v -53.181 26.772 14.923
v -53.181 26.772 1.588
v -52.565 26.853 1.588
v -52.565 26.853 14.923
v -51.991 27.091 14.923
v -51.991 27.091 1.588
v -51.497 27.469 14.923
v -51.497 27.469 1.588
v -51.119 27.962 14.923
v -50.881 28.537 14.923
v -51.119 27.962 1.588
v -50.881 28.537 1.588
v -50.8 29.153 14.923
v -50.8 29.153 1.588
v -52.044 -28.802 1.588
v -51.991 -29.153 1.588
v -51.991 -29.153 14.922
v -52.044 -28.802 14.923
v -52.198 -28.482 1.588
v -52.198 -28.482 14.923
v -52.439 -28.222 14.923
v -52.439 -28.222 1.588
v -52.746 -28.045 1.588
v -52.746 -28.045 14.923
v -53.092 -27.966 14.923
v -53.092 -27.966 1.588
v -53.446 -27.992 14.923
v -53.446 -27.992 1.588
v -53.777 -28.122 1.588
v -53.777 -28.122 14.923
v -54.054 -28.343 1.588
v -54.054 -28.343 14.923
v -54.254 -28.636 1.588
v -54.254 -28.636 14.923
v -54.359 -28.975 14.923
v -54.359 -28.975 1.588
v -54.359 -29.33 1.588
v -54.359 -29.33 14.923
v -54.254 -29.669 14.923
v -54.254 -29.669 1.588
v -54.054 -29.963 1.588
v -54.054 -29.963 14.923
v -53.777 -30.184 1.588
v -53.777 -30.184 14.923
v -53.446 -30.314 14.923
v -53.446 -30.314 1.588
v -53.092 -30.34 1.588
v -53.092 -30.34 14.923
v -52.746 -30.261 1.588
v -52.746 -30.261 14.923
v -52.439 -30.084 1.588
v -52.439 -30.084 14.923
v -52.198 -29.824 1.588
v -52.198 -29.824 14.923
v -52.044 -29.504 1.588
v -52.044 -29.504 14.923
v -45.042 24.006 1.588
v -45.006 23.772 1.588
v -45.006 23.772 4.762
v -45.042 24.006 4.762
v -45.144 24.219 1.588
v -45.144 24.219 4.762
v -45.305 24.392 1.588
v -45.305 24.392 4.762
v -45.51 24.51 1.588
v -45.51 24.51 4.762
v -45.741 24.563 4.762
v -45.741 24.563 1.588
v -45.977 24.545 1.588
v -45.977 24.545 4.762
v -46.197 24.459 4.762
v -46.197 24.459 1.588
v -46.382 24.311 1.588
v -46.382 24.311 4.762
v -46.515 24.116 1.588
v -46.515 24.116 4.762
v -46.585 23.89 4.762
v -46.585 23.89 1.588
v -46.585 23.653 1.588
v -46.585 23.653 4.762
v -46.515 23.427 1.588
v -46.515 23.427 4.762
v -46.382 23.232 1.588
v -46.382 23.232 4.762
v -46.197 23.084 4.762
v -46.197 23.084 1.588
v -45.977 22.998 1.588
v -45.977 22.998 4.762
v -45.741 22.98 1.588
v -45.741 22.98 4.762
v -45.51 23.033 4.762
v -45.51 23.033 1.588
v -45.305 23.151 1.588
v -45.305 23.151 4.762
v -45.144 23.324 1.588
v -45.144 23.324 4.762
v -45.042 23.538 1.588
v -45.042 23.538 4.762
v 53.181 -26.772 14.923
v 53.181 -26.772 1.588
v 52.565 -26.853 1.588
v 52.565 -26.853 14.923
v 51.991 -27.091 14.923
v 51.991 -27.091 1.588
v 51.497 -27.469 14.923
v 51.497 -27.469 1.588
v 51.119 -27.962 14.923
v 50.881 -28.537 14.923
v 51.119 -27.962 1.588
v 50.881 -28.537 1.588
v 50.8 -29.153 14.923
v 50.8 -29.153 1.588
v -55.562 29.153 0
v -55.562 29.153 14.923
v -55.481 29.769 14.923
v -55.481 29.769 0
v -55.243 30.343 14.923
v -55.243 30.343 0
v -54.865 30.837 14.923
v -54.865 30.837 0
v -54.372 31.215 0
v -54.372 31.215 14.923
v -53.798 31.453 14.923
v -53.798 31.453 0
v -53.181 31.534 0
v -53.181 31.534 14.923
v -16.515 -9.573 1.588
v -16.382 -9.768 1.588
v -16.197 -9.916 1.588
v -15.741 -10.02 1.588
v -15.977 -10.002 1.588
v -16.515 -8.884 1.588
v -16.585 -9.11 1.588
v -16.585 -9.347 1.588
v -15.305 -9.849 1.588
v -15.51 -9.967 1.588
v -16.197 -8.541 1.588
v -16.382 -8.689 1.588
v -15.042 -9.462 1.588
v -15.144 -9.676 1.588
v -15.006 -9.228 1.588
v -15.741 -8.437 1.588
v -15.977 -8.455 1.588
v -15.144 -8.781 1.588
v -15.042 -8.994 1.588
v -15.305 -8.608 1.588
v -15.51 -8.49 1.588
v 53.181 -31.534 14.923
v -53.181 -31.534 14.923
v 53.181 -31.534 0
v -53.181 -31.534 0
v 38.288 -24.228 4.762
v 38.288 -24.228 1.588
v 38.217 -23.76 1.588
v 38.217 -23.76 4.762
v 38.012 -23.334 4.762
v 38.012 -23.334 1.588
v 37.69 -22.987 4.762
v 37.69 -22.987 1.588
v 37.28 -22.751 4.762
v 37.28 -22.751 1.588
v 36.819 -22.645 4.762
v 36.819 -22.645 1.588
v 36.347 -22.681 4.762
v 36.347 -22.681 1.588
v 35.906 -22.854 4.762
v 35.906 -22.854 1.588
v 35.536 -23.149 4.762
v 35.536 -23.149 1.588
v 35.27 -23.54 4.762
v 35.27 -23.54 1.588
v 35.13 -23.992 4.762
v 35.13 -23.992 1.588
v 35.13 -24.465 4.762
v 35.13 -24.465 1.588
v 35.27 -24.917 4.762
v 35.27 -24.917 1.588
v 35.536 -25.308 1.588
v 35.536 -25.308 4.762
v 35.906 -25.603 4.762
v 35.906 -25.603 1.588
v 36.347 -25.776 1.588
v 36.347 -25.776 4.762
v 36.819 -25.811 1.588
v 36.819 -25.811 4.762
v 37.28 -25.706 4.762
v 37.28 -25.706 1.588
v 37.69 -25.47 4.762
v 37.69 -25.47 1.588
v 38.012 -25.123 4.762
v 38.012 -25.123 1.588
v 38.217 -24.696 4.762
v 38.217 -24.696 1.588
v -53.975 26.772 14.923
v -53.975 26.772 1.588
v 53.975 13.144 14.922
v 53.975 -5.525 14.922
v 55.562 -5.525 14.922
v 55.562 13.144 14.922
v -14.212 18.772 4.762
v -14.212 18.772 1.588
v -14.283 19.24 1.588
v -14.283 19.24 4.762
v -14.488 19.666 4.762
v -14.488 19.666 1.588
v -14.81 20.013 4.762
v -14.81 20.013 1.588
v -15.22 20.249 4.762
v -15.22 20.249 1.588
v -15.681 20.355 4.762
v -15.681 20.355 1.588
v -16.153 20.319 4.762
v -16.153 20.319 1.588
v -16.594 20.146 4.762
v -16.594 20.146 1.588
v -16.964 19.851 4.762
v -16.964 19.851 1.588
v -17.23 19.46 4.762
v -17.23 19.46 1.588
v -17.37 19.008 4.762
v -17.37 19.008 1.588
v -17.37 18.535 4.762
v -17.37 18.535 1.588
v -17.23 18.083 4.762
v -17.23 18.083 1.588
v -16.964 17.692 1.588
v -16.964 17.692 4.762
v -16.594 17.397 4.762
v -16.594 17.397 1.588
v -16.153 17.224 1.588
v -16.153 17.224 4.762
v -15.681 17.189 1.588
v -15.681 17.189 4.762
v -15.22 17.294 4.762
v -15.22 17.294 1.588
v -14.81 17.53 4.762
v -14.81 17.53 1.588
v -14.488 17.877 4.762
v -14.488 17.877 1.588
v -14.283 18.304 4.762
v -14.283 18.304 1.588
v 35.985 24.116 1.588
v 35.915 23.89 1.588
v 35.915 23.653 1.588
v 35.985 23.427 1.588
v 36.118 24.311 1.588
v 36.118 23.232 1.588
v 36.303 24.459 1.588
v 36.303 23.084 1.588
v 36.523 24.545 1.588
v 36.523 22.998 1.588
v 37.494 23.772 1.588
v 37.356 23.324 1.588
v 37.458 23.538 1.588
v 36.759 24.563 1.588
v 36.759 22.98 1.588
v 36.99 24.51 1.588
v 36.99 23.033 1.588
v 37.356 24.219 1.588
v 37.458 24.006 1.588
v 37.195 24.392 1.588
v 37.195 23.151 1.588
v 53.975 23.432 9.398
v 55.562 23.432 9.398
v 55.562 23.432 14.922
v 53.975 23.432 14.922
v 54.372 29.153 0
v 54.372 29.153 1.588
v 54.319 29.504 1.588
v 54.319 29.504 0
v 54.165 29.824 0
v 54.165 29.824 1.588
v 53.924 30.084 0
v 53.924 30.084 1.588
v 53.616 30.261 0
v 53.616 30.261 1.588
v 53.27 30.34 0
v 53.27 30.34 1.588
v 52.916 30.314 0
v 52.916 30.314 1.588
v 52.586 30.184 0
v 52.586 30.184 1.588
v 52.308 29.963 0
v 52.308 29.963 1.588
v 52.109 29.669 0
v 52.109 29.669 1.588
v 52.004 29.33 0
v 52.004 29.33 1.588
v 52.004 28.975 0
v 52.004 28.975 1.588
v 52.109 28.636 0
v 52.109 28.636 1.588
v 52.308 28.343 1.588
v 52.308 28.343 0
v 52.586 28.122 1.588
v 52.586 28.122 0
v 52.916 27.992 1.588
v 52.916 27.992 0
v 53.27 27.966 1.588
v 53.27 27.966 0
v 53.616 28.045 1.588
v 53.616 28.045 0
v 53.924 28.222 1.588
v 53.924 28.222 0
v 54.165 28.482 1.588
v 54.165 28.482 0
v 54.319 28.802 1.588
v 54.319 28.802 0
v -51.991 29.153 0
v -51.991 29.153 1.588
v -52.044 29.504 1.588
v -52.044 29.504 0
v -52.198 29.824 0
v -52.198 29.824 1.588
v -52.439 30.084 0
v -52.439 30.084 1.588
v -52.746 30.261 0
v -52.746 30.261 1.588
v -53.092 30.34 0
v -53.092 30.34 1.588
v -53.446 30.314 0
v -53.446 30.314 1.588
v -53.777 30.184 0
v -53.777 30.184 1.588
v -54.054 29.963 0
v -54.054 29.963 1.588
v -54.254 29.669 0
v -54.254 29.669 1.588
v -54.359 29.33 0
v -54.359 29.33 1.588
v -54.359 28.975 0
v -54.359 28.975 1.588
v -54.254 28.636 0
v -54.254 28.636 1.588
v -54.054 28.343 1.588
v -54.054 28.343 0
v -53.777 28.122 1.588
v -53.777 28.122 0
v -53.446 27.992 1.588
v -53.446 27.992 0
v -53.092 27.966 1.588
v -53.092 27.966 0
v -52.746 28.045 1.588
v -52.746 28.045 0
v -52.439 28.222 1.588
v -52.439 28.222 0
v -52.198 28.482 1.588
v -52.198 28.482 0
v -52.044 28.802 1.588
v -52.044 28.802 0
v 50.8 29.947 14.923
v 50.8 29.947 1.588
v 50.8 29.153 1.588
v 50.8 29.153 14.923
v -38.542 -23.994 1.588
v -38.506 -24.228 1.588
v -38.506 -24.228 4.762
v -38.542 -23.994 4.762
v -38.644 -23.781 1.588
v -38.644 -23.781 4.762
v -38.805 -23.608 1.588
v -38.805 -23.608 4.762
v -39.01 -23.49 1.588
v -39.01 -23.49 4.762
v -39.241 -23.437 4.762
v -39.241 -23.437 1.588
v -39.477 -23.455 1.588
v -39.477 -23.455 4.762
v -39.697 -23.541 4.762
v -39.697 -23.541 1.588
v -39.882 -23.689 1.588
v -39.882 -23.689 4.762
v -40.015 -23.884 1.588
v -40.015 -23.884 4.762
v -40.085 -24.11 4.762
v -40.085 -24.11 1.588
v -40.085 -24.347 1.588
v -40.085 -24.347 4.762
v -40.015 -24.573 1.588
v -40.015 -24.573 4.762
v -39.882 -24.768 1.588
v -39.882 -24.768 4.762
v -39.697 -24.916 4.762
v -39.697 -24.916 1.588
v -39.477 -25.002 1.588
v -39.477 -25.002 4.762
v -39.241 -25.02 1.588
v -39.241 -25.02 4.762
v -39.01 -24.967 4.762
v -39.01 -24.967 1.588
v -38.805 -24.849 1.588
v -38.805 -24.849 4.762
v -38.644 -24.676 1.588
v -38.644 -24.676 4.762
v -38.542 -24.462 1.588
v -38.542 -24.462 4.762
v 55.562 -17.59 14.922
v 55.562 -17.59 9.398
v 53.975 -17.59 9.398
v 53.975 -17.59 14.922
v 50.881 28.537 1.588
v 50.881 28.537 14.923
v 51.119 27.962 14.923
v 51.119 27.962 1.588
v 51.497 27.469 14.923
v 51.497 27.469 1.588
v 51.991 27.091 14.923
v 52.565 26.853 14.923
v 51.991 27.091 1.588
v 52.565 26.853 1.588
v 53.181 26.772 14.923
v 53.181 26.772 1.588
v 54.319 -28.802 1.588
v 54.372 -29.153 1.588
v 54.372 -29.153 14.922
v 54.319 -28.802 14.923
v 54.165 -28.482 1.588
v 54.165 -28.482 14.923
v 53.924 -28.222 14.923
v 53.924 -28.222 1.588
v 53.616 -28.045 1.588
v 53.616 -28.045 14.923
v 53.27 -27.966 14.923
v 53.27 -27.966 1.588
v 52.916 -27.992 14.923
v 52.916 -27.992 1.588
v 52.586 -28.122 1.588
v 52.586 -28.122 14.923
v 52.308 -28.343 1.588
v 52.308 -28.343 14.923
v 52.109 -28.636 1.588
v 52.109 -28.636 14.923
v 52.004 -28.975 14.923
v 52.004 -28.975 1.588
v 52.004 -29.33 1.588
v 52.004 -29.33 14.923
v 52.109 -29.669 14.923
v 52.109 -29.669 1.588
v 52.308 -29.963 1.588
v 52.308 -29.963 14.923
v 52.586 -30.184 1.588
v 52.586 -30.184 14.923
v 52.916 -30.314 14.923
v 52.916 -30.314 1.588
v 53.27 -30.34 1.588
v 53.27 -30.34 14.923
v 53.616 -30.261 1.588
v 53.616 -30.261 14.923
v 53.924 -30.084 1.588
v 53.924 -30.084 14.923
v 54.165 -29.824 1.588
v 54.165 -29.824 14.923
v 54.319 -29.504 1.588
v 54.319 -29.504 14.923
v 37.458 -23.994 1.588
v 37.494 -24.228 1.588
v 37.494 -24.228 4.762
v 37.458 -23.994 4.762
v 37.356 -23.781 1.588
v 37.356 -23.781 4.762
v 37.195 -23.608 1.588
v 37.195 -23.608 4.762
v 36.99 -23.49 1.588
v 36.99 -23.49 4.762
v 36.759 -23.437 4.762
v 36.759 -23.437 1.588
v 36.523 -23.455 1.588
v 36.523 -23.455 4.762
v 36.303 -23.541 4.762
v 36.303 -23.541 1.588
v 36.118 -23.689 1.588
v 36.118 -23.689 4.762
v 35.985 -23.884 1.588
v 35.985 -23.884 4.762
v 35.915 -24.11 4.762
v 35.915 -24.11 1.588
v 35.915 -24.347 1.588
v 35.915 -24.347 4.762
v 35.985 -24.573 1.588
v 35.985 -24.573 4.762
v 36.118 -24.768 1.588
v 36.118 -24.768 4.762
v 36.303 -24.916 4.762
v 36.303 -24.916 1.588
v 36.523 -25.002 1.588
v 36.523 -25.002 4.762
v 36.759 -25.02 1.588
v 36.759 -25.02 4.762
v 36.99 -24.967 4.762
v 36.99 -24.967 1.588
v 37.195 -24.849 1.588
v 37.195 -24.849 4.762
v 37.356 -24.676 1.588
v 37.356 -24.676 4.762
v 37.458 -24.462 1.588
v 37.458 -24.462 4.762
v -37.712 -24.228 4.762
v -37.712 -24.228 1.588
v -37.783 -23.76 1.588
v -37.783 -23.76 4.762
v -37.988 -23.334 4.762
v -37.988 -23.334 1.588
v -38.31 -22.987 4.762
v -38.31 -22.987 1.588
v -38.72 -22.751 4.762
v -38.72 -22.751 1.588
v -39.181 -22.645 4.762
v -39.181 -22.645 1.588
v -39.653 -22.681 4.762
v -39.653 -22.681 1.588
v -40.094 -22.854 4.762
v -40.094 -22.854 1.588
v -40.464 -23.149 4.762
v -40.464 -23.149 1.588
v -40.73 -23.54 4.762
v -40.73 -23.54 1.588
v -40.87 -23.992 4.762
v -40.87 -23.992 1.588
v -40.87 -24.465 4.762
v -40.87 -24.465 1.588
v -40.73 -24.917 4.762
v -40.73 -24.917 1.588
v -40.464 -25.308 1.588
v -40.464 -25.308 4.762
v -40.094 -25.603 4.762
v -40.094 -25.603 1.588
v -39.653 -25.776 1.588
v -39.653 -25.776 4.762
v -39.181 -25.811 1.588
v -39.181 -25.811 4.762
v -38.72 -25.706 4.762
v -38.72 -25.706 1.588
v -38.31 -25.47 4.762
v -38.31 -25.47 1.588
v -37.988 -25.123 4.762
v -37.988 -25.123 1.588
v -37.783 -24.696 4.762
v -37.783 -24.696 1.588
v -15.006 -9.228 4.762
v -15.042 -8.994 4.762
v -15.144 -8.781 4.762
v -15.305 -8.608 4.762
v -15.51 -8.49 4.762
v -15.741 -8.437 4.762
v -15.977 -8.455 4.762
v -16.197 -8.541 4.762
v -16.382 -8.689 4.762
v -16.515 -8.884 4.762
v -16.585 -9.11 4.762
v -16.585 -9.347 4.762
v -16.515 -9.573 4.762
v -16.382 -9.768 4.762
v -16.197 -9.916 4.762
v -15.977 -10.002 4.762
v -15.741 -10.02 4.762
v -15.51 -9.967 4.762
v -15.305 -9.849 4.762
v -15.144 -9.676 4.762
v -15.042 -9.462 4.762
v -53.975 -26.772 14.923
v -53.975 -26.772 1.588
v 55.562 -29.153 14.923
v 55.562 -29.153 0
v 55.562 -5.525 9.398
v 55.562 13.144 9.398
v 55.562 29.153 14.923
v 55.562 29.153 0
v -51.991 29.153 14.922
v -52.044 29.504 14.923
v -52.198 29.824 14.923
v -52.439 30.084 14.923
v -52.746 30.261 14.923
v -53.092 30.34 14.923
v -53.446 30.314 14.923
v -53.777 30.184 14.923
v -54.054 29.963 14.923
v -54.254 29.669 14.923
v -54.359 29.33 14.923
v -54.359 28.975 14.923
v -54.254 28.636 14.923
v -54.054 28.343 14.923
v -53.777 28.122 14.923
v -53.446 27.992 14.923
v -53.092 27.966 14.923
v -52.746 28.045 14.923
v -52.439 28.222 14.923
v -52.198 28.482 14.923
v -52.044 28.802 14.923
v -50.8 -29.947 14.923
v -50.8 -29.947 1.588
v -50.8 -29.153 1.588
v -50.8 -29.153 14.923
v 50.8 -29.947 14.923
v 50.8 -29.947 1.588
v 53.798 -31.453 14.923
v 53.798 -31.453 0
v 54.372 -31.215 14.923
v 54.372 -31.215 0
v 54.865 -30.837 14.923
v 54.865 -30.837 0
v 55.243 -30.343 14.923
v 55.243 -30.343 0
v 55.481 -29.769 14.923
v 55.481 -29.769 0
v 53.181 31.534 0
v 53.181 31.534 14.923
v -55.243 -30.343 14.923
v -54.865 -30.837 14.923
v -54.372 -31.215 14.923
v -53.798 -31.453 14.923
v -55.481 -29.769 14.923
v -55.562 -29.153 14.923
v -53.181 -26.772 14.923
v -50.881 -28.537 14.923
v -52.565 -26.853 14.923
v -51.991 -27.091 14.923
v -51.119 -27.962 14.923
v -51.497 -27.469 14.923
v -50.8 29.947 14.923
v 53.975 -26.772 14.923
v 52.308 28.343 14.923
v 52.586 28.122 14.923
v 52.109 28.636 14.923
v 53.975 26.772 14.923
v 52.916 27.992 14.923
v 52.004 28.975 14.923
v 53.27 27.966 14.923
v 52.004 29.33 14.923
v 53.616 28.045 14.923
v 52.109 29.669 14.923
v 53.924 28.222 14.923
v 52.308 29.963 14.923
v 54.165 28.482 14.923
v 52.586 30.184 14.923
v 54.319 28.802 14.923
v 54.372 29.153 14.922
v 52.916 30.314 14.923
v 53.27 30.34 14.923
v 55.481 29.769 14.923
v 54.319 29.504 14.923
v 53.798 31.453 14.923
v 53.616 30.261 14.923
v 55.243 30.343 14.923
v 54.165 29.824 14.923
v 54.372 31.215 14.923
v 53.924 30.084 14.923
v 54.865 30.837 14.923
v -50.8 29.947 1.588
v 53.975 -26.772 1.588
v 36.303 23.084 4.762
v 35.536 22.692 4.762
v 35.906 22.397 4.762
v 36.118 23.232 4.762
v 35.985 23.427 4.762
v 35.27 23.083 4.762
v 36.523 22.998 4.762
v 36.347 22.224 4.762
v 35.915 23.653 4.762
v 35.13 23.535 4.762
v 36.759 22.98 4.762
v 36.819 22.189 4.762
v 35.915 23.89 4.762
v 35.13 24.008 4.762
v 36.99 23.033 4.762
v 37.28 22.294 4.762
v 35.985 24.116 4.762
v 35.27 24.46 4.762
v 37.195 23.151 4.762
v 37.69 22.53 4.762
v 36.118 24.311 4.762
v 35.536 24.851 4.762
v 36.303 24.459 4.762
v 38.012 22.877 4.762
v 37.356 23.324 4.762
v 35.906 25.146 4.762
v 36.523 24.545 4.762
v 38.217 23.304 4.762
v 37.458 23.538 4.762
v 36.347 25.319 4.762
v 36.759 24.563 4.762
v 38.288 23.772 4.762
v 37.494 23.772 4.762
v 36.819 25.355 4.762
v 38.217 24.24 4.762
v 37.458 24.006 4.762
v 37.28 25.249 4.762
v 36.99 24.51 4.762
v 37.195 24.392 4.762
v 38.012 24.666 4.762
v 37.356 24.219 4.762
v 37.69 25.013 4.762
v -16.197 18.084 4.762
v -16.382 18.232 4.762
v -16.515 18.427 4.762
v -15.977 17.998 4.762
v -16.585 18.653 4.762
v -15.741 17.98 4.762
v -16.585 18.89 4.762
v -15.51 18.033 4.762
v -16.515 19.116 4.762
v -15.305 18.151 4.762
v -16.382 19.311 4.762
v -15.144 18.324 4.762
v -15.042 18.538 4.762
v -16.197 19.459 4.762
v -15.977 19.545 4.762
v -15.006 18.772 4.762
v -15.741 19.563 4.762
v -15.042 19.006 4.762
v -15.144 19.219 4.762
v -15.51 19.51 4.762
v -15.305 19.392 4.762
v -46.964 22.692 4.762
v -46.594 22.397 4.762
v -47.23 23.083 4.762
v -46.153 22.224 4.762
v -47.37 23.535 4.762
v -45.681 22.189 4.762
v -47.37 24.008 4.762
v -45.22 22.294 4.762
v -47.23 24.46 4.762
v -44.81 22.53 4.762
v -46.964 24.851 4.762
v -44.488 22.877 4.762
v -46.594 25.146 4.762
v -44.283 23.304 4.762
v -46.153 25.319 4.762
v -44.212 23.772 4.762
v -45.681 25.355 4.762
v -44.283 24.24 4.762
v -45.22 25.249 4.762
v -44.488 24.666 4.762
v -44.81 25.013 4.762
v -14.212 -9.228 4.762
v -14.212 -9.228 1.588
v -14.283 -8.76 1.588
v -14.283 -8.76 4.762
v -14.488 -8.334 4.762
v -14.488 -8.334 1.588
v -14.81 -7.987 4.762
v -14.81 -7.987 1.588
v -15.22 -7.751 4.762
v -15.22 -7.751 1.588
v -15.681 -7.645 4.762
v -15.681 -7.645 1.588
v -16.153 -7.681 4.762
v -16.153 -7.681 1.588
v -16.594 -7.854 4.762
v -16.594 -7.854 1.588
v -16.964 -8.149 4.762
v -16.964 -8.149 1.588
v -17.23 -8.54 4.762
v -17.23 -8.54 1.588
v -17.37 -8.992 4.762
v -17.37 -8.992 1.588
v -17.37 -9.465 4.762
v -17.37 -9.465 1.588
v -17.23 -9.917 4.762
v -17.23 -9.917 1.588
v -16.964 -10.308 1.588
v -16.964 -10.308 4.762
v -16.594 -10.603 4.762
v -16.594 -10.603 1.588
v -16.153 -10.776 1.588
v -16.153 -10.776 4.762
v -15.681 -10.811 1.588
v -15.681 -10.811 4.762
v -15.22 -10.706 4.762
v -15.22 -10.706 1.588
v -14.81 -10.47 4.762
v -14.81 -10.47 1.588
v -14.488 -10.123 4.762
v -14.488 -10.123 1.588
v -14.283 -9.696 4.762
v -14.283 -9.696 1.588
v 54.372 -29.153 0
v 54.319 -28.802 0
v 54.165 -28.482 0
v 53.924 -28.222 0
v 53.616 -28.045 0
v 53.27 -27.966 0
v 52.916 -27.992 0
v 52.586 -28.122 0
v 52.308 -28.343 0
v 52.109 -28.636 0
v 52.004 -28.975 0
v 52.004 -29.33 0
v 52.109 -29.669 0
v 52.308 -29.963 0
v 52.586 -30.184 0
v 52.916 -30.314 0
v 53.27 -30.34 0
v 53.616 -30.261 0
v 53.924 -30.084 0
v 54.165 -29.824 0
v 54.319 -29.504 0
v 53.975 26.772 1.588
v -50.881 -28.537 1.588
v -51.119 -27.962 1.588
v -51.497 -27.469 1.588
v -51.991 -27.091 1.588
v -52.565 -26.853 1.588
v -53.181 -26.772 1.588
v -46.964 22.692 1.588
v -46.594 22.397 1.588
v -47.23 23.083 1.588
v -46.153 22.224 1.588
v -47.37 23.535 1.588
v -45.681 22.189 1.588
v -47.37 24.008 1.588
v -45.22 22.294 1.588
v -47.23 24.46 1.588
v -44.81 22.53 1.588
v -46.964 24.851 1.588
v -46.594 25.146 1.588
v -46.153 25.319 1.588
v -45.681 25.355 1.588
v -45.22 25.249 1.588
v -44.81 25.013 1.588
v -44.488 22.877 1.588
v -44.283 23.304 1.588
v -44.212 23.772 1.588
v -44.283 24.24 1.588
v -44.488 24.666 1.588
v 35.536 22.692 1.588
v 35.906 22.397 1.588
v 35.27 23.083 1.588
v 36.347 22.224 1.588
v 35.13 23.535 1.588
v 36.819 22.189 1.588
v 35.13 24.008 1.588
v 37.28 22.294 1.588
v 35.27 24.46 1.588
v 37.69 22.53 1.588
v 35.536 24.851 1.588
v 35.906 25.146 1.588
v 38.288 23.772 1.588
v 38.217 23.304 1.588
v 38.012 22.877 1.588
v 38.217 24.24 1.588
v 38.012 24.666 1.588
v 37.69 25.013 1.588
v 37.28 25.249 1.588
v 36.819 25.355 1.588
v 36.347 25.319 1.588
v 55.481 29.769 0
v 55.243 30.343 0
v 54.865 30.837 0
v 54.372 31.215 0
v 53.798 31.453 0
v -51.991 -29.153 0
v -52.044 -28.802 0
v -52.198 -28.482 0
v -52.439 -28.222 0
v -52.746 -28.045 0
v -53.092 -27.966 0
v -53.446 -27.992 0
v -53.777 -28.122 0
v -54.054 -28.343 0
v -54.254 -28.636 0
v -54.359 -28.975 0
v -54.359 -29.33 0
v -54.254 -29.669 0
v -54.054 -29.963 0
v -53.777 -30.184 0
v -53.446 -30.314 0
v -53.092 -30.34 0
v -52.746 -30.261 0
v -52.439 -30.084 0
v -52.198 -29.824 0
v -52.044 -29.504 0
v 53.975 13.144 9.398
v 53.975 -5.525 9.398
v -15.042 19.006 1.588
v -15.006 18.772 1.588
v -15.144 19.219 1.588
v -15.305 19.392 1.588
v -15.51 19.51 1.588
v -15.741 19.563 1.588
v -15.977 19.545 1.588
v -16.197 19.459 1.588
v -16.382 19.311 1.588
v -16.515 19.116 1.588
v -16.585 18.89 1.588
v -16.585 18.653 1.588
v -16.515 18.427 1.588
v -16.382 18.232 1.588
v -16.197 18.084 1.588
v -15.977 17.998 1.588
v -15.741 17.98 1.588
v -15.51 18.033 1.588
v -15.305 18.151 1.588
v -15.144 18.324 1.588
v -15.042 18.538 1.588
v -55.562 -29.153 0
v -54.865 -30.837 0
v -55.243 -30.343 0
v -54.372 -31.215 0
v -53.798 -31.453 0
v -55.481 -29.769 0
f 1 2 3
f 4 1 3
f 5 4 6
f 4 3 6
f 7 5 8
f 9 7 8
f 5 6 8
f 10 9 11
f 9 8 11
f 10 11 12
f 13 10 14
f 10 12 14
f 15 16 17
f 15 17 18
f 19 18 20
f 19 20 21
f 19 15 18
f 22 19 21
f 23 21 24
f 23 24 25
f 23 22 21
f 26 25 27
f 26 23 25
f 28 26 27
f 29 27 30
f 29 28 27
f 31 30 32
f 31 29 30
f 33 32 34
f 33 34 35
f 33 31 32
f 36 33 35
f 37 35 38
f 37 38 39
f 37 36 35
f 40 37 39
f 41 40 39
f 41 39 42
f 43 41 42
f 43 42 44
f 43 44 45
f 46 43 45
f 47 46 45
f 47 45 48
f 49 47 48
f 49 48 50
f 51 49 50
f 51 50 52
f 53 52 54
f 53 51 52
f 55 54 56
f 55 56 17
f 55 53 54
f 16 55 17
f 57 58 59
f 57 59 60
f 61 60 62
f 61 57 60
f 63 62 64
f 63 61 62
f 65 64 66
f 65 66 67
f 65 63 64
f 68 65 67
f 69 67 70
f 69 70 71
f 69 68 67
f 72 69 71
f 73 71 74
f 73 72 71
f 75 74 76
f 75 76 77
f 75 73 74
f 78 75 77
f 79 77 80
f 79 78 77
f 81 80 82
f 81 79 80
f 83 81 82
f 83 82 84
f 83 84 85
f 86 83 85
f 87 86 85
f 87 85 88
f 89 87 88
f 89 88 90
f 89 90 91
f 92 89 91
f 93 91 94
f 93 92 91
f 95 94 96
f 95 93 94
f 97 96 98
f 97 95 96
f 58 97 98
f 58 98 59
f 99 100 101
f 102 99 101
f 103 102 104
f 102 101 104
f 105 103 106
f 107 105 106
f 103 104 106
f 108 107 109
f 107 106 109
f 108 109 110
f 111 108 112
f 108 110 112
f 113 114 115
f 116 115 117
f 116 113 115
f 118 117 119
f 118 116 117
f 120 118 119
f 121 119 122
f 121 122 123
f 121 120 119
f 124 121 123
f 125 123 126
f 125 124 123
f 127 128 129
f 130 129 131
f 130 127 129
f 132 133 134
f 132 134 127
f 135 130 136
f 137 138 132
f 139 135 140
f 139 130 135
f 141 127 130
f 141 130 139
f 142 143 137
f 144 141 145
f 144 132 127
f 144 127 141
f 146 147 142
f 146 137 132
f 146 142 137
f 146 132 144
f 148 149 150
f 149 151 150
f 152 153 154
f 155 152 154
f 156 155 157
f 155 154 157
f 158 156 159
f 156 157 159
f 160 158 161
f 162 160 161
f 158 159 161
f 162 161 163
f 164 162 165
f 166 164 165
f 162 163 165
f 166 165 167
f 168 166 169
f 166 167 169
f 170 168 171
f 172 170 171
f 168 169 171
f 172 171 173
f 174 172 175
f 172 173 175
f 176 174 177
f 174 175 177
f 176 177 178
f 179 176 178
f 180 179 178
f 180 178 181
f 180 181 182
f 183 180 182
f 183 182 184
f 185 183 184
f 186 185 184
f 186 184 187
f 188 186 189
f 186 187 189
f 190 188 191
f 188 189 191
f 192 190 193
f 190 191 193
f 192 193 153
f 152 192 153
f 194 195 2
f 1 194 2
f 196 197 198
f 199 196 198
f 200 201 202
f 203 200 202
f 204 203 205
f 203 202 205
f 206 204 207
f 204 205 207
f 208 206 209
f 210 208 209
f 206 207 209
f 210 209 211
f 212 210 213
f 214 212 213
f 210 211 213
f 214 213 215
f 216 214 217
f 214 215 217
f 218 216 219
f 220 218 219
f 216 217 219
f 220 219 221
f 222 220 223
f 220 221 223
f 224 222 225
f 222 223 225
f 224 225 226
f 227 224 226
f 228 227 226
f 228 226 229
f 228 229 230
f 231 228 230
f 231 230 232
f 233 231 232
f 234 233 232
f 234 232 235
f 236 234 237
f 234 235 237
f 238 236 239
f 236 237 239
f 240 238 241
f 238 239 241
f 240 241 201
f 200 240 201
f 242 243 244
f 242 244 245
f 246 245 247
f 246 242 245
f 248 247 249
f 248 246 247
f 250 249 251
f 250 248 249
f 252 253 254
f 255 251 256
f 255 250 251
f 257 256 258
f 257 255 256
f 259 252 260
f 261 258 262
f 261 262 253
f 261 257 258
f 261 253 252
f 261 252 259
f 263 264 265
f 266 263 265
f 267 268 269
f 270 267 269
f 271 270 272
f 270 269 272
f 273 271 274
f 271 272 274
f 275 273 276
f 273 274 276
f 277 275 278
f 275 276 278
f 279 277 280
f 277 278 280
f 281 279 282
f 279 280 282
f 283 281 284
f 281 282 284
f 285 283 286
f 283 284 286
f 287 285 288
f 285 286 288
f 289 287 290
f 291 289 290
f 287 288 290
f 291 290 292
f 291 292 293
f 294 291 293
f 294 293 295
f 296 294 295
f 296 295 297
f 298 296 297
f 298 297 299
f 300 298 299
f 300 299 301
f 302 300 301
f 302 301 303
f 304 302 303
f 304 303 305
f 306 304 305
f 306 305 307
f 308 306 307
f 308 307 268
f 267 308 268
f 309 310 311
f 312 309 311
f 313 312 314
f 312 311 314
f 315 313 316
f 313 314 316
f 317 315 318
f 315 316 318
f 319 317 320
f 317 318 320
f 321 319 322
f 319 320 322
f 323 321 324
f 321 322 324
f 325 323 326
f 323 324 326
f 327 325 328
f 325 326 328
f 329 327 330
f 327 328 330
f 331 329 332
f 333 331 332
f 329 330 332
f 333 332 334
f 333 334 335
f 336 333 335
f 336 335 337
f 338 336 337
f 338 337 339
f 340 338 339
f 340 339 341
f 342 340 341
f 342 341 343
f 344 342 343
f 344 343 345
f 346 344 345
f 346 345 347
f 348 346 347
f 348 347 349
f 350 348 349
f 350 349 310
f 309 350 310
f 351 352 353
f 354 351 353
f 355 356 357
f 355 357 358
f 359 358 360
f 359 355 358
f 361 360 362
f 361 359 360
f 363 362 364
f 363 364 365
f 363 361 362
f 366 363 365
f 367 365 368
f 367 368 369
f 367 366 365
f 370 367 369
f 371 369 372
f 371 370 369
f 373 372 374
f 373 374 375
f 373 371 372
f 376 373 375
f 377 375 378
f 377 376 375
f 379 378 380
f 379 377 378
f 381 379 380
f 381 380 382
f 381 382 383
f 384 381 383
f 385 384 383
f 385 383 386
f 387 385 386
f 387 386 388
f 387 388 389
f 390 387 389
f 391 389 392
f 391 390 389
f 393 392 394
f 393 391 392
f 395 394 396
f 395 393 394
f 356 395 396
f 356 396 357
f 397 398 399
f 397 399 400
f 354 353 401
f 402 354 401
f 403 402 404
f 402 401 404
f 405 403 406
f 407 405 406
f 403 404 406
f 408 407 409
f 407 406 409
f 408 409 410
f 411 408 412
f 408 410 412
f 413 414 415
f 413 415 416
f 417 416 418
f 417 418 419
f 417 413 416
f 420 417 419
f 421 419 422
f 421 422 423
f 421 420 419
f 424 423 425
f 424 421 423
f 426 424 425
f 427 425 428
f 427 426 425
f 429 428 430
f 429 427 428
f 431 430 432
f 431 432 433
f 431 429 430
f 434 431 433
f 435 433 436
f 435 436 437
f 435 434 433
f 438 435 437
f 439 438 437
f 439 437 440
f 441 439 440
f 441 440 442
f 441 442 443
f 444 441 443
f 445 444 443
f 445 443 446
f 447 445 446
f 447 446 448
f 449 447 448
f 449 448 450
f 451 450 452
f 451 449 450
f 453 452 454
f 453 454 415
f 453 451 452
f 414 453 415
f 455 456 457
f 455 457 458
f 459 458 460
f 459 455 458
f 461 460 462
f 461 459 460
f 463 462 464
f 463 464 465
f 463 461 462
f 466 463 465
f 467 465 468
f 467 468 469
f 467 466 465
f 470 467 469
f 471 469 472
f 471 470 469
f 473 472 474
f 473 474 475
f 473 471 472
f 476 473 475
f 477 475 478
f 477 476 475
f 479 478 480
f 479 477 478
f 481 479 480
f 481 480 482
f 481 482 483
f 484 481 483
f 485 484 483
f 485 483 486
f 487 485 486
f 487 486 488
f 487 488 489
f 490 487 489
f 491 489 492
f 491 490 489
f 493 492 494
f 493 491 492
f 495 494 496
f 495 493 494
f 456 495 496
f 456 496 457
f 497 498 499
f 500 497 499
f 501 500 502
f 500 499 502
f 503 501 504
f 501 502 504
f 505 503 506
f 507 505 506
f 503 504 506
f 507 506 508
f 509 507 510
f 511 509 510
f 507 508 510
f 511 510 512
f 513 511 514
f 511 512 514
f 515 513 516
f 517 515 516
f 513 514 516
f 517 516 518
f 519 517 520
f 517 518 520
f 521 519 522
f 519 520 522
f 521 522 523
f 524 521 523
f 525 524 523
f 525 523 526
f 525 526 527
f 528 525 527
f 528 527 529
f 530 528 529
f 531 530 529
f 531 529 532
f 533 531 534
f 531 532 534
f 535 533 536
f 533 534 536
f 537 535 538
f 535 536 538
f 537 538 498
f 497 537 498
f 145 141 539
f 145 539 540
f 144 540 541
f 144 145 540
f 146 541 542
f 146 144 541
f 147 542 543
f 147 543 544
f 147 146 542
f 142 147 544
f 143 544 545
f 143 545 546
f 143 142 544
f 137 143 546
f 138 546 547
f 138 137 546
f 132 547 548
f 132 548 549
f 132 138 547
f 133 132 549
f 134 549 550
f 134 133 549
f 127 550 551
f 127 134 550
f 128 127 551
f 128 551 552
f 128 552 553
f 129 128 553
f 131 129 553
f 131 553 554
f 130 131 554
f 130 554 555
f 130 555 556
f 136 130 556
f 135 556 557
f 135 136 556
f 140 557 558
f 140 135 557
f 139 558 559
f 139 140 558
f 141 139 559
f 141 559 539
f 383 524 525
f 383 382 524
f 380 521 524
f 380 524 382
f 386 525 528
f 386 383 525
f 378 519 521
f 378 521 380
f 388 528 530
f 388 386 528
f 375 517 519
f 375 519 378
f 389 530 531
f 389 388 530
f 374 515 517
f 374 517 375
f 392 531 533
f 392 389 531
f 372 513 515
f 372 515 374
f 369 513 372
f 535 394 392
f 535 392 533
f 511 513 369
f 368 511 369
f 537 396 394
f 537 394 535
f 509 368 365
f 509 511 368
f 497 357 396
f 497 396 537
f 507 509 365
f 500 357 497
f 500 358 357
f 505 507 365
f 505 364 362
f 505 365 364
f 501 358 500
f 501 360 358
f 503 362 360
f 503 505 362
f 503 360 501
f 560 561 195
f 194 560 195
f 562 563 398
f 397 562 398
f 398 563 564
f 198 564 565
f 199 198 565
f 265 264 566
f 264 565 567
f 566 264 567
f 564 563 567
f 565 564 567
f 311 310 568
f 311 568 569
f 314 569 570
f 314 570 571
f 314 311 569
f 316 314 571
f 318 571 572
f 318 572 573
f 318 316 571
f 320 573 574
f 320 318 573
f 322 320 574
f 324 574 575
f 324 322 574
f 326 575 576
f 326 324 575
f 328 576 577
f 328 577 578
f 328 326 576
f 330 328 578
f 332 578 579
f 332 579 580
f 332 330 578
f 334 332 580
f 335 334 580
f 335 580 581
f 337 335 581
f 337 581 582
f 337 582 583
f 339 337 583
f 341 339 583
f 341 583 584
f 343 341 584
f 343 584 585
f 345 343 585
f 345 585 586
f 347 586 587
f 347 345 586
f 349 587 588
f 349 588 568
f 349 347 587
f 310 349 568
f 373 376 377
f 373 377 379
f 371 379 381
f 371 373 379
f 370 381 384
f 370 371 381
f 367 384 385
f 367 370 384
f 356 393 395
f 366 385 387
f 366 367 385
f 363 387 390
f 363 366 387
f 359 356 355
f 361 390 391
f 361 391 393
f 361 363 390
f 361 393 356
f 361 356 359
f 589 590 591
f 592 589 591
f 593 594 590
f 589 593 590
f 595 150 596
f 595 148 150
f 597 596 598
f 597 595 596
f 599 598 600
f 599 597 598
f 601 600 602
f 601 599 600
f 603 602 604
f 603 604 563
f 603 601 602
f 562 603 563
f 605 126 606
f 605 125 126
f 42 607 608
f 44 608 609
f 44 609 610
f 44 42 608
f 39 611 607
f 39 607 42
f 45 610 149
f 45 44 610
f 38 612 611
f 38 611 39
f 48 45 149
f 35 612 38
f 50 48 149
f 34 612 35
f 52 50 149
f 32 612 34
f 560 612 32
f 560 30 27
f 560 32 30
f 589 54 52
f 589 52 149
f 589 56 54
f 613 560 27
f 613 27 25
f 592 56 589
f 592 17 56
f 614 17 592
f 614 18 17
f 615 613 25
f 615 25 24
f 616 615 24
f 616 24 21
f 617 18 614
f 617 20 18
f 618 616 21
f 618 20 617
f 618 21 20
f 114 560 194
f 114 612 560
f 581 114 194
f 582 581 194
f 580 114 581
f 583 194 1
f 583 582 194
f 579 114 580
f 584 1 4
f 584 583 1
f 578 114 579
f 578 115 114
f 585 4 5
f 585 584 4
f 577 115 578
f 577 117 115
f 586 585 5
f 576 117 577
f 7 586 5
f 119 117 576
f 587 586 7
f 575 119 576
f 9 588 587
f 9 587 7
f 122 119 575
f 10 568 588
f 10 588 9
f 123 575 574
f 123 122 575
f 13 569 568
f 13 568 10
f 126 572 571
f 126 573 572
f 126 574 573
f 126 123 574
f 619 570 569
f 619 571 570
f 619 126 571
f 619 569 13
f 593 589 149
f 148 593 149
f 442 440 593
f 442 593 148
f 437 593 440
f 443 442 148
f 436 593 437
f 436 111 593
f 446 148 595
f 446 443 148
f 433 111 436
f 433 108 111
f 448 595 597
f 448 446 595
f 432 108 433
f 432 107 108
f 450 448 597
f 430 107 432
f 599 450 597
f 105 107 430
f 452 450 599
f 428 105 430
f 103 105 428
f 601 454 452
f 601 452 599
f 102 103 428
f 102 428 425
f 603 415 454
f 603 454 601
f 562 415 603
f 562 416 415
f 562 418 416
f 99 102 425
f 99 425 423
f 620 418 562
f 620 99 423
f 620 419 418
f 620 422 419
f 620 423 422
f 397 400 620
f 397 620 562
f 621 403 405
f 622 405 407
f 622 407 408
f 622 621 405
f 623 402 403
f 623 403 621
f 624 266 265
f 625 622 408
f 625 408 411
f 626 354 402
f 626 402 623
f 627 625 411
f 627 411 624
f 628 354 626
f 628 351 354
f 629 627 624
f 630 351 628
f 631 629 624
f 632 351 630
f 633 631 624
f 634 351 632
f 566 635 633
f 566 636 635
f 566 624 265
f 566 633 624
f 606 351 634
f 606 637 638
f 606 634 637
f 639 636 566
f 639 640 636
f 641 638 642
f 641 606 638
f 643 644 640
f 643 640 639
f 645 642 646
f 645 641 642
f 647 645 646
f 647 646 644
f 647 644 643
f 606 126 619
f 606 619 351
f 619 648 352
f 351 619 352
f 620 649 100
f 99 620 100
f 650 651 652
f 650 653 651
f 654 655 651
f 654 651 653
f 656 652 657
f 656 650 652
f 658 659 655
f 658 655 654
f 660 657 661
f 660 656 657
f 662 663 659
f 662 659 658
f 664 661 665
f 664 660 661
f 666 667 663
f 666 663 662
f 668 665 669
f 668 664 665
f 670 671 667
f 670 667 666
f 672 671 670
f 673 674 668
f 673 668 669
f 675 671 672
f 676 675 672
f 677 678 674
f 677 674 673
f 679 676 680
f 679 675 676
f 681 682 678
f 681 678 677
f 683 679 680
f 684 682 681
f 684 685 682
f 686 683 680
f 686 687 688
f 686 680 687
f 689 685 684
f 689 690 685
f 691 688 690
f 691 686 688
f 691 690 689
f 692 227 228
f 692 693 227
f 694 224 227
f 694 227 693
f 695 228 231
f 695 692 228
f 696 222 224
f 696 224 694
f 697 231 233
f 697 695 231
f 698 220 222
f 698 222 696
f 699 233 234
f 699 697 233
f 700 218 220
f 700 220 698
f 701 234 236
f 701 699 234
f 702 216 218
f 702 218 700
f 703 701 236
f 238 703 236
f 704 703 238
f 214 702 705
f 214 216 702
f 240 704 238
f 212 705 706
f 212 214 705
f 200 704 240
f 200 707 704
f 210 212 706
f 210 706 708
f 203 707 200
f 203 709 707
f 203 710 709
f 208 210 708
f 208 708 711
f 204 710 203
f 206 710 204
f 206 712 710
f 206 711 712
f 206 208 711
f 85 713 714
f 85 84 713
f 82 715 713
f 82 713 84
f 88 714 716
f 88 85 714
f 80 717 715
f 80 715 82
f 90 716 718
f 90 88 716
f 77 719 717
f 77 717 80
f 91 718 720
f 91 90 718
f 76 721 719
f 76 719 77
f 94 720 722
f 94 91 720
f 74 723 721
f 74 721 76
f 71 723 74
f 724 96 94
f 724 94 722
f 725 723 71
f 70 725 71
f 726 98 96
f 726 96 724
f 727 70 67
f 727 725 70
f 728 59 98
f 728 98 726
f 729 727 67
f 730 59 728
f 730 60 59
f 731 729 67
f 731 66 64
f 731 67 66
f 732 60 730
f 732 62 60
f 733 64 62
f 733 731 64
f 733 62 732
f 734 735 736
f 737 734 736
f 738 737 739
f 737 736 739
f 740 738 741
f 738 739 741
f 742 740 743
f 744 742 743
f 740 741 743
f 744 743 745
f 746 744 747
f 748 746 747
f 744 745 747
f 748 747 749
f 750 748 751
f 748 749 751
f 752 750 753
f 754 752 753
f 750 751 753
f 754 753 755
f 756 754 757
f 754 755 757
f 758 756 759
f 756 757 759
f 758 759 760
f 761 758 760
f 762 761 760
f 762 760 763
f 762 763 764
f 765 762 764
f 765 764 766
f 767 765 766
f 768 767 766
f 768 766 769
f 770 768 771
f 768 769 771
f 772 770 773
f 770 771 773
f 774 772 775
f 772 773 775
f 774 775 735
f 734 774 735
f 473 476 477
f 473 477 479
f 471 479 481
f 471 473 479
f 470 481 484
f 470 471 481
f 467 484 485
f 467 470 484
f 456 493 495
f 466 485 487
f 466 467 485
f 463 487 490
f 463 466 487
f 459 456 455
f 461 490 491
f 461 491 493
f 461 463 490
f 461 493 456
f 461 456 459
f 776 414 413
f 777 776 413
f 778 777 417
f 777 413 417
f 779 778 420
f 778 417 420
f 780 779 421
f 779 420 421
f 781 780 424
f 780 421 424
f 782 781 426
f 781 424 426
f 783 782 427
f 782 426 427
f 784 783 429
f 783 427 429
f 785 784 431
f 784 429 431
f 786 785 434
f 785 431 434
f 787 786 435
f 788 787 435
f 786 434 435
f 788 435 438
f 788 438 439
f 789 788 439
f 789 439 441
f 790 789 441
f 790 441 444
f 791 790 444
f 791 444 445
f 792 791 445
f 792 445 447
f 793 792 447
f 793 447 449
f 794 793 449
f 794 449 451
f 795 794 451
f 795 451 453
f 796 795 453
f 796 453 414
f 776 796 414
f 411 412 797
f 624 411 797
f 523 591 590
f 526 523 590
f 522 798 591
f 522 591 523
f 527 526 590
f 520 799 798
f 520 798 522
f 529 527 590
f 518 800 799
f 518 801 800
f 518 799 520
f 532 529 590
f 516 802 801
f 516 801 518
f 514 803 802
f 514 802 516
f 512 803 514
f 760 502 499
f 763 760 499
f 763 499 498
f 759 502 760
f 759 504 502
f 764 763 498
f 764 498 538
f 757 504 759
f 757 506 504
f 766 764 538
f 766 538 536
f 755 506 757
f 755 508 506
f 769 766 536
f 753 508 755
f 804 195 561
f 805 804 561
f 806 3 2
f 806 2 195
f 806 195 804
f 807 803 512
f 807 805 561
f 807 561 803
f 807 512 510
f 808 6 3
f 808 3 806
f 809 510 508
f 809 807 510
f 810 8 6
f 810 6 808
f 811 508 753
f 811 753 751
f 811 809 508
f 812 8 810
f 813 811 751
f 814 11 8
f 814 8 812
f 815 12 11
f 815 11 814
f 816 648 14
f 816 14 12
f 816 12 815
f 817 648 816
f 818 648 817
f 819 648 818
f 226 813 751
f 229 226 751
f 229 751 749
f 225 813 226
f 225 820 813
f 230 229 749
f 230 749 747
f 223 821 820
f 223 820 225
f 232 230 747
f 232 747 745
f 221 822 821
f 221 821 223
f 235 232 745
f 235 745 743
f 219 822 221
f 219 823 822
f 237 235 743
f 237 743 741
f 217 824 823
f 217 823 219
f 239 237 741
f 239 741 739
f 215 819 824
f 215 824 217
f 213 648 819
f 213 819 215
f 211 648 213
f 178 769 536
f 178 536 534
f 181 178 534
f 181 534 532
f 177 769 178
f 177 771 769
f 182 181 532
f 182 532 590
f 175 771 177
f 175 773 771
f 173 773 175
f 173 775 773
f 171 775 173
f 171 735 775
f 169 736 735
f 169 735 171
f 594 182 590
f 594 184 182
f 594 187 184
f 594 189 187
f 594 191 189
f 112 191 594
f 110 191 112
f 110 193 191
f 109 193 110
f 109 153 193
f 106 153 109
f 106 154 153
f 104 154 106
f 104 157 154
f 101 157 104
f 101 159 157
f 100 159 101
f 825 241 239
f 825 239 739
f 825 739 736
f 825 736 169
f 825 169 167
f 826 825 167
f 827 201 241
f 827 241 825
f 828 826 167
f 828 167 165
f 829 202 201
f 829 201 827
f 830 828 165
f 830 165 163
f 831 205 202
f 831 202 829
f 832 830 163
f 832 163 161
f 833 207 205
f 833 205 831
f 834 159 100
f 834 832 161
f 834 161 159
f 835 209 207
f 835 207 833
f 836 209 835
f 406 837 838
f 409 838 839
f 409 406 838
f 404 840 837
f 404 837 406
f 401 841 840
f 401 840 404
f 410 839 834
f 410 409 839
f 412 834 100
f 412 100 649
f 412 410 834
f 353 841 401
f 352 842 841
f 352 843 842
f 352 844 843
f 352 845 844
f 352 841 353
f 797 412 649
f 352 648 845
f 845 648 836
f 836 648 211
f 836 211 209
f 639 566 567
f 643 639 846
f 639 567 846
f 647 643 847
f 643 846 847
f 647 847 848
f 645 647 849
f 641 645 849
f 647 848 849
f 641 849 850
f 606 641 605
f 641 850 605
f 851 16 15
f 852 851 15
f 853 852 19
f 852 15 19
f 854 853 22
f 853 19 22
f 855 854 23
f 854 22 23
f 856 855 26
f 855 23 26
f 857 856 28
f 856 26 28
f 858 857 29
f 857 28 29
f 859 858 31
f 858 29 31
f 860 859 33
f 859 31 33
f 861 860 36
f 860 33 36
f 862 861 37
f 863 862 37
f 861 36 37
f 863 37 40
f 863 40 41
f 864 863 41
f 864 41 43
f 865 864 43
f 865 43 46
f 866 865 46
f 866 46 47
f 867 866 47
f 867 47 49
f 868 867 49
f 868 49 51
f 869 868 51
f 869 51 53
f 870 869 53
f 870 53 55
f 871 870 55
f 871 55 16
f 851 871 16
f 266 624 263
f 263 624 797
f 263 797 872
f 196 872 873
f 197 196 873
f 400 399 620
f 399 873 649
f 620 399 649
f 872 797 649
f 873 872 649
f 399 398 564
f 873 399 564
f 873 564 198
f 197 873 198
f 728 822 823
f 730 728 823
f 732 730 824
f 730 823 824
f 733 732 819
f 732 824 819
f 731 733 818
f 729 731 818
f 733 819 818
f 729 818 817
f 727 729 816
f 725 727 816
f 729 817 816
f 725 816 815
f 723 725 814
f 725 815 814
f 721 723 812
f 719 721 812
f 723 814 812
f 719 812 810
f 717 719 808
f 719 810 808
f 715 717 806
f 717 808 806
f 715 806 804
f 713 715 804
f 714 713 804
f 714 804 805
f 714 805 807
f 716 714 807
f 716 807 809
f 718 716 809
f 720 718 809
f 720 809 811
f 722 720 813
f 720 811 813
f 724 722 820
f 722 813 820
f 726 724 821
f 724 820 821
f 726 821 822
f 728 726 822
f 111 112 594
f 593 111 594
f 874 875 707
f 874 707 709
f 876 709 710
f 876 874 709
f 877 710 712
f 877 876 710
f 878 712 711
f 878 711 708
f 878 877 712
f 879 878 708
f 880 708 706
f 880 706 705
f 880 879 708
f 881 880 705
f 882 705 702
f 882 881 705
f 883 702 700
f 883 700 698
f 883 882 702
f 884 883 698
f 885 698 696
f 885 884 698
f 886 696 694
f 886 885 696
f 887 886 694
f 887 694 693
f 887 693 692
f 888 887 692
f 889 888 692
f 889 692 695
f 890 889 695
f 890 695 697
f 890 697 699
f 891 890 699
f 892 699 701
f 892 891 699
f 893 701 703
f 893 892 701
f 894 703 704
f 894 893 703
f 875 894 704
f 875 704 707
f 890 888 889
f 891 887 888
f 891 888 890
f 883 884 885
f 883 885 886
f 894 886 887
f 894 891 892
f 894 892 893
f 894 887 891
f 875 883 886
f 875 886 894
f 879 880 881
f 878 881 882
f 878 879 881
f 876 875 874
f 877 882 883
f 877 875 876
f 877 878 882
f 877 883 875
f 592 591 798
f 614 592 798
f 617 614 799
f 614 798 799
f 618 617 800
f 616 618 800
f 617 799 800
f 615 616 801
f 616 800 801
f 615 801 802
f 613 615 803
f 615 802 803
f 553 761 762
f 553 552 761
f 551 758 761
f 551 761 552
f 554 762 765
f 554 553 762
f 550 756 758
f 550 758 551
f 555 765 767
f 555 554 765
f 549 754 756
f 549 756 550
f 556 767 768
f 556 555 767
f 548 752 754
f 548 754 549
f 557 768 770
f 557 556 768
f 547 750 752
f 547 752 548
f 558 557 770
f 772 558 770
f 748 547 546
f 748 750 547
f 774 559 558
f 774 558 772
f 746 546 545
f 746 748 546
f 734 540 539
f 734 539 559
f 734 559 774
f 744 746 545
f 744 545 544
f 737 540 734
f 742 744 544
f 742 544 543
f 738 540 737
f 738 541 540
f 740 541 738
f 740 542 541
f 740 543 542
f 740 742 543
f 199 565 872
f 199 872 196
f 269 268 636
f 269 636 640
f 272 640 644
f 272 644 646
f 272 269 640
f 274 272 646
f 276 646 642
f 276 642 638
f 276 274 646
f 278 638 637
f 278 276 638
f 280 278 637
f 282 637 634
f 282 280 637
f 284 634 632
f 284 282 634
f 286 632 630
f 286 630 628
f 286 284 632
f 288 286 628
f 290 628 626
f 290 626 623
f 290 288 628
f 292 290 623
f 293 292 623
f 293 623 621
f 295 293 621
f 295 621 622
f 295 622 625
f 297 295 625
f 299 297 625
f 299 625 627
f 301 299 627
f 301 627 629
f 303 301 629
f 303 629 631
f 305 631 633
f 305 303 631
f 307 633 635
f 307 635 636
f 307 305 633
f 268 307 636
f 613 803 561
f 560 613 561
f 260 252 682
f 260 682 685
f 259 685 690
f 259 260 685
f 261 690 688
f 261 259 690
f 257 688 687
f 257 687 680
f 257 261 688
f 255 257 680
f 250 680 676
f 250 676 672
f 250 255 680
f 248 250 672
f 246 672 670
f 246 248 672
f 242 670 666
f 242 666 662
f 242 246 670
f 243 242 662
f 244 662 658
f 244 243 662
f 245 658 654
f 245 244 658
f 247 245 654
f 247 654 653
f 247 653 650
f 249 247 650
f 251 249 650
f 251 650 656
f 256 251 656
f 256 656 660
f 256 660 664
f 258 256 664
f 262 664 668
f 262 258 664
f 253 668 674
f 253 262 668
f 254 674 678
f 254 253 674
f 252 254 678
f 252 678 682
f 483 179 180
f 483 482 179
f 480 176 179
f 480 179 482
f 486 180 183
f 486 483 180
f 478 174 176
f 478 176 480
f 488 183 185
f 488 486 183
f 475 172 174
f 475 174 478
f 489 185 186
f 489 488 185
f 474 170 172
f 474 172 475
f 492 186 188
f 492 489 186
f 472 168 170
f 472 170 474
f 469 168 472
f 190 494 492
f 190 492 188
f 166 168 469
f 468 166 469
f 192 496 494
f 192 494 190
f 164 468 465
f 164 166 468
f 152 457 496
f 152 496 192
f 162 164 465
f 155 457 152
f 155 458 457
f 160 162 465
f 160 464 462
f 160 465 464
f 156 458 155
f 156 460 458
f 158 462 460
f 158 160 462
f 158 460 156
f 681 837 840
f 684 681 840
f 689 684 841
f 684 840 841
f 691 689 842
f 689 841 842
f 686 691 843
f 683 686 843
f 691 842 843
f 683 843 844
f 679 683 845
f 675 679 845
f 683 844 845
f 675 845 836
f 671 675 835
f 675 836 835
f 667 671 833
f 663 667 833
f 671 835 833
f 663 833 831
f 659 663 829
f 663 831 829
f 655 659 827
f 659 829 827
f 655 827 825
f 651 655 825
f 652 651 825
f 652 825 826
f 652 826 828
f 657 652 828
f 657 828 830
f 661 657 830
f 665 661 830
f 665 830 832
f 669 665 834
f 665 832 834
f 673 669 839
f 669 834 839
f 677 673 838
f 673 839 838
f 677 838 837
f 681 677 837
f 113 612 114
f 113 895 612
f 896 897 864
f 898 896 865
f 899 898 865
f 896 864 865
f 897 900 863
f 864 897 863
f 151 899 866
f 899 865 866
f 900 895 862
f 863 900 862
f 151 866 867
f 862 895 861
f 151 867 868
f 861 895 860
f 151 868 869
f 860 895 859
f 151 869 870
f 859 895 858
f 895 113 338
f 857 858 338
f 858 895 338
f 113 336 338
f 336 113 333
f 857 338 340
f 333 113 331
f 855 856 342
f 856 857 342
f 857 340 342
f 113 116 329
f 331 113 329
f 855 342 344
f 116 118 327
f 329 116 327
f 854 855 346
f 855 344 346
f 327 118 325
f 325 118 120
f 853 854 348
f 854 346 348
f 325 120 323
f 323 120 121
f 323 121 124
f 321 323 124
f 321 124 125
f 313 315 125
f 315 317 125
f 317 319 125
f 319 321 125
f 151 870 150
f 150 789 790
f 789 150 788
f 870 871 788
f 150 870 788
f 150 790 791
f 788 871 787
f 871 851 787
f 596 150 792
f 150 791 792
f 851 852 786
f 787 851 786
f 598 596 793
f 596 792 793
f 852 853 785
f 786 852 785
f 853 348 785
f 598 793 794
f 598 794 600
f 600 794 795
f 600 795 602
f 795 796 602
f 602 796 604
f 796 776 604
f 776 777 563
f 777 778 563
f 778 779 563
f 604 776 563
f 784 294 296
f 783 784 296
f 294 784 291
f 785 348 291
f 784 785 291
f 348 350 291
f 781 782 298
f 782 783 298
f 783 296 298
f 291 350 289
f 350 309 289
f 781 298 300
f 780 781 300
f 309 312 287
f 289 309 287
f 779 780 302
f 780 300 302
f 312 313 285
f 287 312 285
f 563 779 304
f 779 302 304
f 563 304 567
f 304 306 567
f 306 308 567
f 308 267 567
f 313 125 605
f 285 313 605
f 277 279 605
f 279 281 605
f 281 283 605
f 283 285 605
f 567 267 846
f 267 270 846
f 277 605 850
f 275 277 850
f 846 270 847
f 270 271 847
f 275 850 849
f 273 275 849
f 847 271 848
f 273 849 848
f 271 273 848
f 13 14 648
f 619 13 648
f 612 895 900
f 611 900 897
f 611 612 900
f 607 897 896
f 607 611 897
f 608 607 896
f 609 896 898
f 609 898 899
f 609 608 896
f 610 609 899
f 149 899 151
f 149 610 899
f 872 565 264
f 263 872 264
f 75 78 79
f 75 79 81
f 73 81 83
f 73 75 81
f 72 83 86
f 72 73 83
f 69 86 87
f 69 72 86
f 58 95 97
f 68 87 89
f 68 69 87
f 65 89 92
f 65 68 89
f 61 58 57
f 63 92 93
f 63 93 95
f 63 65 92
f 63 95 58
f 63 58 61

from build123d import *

# Parameters (mm, degrees)
F1_W      = 111.125
F1_H      = 63.0682
F2_DEPTH  = 1.5875
F3_W      = 111.125
F3_H      = 63.0682
F3_R      = 1.190625
F4_DEPTH  = 13.335
F5_R      = 2.38125
F6_W      = 12.065
F6_H      = 5.5245
F6_W_2    = 10.287
F7_DEPTH  = 1.5875
F8_R      = 1.5875
F8_R_2    = 0.79375
F9_DEPTH  = 3.175
F10_R     = 1.190625
F11_DEPTH = 14.9235


with BuildPart() as f2:
    # F1 (on Top) → F2 (new body)
    with BuildSketch(Plane.XY):
        Rectangle(F1_W, F1_H)
    extrude(amount=F2_DEPTH)

    # F3 (on face) → F4 (join)
    with BuildSketch(Plane.XY.offset(1.5875)):
        Rectangle(F3_W, F3_H)
        with Locations((-53.18125, -29.15285)):
            Circle(F3_R, mode=Mode.SUBTRACT)
        with Locations((53.18125, -29.15285)):
            Circle(F3_R, mode=Mode.SUBTRACT)
        with BuildLine():
            Line((53.18125, 26.7716), (53.975, 26.7716))
            Line((53.975, 26.7716), (53.975, -26.7716))
            Line((53.975, -26.7716), (53.18125, -26.7716))
            ThreePointArc((53.18125, -26.7716), (51.497452, -27.469052), (50.8, -29.15285))
            Line((50.8, -29.15285), (50.8, -29.9466))
            Line((50.8, -29.9466), (-50.8, -29.9466))
            Line((-50.8, -29.9466), (-50.8, -29.15285))
            ThreePointArc((-50.8, -29.15285), (-51.497452, -27.469052), (-53.18125, -26.7716))
            Line((-53.18125, -26.7716), (-53.975, -26.7716))
            Line((-53.975, -26.7716), (-53.975, 26.7716))
            Line((-53.975, 26.7716), (-53.18125, 26.7716))
            ThreePointArc((-53.18125, 26.7716), (-51.497452, 27.469052), (-50.8, 29.15285))
            Line((-50.8, 29.15285), (-50.8, 29.9466))
            Line((-50.8, 29.9466), (50.8, 29.9466))
            Line((50.8, 29.9466), (50.8, 29.15285))
            ThreePointArc((50.8, 29.15285), (51.497452, 27.469052), (53.18125, 26.7716))
        make_face(mode=Mode.SUBTRACT)
        with Locations((-53.18125, 29.15285)):
            Circle(F3_R, mode=Mode.SUBTRACT)
        with Locations((53.18125, 29.15285)):
            Circle(F3_R, mode=Mode.SUBTRACT)
    extrude(amount=F4_DEPTH)

    # F5
    f5_edges = [f2.edges().sort_by_distance(p)[0] for p in [
        (55.5625, -31.5341, 7.46125),
        (55.5625, 31.5341, 7.46125),
        (-55.5625, -31.5341, 7.46125),
        (-55.5625, 31.5341, 7.46125),
    ]]
    fillet(f5_edges, radius=F5_R)

    # F6 (on face) → F7 (cut, through all)
    with BuildSketch(Plane.YZ.offset(55.5625)):
        with Locations((-11.557, 12.16025)):
            Rectangle(F6_W, F6_H)
        with Locations((18.288, 12.16025)):
            Rectangle(F6_W_2, F6_H)
    extrude(amount=-F7_DEPTH, mode=Mode.SUBTRACT)

    # F8 (on face) → F9 (join)
    with BuildSketch(Plane.XY.offset(1.5875)):
        with Locations((-45.8, 23.7716)):
            Circle(F8_R)
        with Locations((-45.8, 23.7716)):
            Circle(F8_R_2, mode=Mode.SUBTRACT)
        with Locations((-39.3, -24.2284)):
            Circle(F8_R)
        with Locations((-39.3, -24.2284)):
            Circle(F8_R_2, mode=Mode.SUBTRACT)
        with Locations((-15.8, 18.7716)):
            Circle(F8_R)
        with Locations((-15.8, 18.7716)):
            Circle(F8_R_2, mode=Mode.SUBTRACT)
        with Locations((-15.8, -9.2284)):
            Circle(F8_R)
        with Locations((-15.8, -9.2284)):
            Circle(F8_R_2, mode=Mode.SUBTRACT)
        with Locations((36.7, 23.7716)):
            Circle(F8_R)
        with Locations((36.7, 23.7716)):
            Circle(F8_R_2, mode=Mode.SUBTRACT)
        with Locations((36.7, -24.2284)):
            Circle(F8_R)
        with Locations((36.7, -24.2284)):
            Circle(F8_R_2, mode=Mode.SUBTRACT)
    extrude(amount=F9_DEPTH)

    # F10 (on face) → F11 (cut, through all)
    with BuildSketch(Plane.XY.offset(14.9225)):
        with Locations((-53.18125, 29.15285)):
            Circle(F10_R)
        with Locations((-53.18125, -29.15285)):
            Circle(F10_R)
        with Locations((53.18125, -29.15285)):
            Circle(F10_R)
        with Locations((53.18125, 29.15285)):
            Circle(F10_R)
    extrude(amount=-F11_DEPTH, mode=Mode.SUBTRACT)


solid = f2.part
